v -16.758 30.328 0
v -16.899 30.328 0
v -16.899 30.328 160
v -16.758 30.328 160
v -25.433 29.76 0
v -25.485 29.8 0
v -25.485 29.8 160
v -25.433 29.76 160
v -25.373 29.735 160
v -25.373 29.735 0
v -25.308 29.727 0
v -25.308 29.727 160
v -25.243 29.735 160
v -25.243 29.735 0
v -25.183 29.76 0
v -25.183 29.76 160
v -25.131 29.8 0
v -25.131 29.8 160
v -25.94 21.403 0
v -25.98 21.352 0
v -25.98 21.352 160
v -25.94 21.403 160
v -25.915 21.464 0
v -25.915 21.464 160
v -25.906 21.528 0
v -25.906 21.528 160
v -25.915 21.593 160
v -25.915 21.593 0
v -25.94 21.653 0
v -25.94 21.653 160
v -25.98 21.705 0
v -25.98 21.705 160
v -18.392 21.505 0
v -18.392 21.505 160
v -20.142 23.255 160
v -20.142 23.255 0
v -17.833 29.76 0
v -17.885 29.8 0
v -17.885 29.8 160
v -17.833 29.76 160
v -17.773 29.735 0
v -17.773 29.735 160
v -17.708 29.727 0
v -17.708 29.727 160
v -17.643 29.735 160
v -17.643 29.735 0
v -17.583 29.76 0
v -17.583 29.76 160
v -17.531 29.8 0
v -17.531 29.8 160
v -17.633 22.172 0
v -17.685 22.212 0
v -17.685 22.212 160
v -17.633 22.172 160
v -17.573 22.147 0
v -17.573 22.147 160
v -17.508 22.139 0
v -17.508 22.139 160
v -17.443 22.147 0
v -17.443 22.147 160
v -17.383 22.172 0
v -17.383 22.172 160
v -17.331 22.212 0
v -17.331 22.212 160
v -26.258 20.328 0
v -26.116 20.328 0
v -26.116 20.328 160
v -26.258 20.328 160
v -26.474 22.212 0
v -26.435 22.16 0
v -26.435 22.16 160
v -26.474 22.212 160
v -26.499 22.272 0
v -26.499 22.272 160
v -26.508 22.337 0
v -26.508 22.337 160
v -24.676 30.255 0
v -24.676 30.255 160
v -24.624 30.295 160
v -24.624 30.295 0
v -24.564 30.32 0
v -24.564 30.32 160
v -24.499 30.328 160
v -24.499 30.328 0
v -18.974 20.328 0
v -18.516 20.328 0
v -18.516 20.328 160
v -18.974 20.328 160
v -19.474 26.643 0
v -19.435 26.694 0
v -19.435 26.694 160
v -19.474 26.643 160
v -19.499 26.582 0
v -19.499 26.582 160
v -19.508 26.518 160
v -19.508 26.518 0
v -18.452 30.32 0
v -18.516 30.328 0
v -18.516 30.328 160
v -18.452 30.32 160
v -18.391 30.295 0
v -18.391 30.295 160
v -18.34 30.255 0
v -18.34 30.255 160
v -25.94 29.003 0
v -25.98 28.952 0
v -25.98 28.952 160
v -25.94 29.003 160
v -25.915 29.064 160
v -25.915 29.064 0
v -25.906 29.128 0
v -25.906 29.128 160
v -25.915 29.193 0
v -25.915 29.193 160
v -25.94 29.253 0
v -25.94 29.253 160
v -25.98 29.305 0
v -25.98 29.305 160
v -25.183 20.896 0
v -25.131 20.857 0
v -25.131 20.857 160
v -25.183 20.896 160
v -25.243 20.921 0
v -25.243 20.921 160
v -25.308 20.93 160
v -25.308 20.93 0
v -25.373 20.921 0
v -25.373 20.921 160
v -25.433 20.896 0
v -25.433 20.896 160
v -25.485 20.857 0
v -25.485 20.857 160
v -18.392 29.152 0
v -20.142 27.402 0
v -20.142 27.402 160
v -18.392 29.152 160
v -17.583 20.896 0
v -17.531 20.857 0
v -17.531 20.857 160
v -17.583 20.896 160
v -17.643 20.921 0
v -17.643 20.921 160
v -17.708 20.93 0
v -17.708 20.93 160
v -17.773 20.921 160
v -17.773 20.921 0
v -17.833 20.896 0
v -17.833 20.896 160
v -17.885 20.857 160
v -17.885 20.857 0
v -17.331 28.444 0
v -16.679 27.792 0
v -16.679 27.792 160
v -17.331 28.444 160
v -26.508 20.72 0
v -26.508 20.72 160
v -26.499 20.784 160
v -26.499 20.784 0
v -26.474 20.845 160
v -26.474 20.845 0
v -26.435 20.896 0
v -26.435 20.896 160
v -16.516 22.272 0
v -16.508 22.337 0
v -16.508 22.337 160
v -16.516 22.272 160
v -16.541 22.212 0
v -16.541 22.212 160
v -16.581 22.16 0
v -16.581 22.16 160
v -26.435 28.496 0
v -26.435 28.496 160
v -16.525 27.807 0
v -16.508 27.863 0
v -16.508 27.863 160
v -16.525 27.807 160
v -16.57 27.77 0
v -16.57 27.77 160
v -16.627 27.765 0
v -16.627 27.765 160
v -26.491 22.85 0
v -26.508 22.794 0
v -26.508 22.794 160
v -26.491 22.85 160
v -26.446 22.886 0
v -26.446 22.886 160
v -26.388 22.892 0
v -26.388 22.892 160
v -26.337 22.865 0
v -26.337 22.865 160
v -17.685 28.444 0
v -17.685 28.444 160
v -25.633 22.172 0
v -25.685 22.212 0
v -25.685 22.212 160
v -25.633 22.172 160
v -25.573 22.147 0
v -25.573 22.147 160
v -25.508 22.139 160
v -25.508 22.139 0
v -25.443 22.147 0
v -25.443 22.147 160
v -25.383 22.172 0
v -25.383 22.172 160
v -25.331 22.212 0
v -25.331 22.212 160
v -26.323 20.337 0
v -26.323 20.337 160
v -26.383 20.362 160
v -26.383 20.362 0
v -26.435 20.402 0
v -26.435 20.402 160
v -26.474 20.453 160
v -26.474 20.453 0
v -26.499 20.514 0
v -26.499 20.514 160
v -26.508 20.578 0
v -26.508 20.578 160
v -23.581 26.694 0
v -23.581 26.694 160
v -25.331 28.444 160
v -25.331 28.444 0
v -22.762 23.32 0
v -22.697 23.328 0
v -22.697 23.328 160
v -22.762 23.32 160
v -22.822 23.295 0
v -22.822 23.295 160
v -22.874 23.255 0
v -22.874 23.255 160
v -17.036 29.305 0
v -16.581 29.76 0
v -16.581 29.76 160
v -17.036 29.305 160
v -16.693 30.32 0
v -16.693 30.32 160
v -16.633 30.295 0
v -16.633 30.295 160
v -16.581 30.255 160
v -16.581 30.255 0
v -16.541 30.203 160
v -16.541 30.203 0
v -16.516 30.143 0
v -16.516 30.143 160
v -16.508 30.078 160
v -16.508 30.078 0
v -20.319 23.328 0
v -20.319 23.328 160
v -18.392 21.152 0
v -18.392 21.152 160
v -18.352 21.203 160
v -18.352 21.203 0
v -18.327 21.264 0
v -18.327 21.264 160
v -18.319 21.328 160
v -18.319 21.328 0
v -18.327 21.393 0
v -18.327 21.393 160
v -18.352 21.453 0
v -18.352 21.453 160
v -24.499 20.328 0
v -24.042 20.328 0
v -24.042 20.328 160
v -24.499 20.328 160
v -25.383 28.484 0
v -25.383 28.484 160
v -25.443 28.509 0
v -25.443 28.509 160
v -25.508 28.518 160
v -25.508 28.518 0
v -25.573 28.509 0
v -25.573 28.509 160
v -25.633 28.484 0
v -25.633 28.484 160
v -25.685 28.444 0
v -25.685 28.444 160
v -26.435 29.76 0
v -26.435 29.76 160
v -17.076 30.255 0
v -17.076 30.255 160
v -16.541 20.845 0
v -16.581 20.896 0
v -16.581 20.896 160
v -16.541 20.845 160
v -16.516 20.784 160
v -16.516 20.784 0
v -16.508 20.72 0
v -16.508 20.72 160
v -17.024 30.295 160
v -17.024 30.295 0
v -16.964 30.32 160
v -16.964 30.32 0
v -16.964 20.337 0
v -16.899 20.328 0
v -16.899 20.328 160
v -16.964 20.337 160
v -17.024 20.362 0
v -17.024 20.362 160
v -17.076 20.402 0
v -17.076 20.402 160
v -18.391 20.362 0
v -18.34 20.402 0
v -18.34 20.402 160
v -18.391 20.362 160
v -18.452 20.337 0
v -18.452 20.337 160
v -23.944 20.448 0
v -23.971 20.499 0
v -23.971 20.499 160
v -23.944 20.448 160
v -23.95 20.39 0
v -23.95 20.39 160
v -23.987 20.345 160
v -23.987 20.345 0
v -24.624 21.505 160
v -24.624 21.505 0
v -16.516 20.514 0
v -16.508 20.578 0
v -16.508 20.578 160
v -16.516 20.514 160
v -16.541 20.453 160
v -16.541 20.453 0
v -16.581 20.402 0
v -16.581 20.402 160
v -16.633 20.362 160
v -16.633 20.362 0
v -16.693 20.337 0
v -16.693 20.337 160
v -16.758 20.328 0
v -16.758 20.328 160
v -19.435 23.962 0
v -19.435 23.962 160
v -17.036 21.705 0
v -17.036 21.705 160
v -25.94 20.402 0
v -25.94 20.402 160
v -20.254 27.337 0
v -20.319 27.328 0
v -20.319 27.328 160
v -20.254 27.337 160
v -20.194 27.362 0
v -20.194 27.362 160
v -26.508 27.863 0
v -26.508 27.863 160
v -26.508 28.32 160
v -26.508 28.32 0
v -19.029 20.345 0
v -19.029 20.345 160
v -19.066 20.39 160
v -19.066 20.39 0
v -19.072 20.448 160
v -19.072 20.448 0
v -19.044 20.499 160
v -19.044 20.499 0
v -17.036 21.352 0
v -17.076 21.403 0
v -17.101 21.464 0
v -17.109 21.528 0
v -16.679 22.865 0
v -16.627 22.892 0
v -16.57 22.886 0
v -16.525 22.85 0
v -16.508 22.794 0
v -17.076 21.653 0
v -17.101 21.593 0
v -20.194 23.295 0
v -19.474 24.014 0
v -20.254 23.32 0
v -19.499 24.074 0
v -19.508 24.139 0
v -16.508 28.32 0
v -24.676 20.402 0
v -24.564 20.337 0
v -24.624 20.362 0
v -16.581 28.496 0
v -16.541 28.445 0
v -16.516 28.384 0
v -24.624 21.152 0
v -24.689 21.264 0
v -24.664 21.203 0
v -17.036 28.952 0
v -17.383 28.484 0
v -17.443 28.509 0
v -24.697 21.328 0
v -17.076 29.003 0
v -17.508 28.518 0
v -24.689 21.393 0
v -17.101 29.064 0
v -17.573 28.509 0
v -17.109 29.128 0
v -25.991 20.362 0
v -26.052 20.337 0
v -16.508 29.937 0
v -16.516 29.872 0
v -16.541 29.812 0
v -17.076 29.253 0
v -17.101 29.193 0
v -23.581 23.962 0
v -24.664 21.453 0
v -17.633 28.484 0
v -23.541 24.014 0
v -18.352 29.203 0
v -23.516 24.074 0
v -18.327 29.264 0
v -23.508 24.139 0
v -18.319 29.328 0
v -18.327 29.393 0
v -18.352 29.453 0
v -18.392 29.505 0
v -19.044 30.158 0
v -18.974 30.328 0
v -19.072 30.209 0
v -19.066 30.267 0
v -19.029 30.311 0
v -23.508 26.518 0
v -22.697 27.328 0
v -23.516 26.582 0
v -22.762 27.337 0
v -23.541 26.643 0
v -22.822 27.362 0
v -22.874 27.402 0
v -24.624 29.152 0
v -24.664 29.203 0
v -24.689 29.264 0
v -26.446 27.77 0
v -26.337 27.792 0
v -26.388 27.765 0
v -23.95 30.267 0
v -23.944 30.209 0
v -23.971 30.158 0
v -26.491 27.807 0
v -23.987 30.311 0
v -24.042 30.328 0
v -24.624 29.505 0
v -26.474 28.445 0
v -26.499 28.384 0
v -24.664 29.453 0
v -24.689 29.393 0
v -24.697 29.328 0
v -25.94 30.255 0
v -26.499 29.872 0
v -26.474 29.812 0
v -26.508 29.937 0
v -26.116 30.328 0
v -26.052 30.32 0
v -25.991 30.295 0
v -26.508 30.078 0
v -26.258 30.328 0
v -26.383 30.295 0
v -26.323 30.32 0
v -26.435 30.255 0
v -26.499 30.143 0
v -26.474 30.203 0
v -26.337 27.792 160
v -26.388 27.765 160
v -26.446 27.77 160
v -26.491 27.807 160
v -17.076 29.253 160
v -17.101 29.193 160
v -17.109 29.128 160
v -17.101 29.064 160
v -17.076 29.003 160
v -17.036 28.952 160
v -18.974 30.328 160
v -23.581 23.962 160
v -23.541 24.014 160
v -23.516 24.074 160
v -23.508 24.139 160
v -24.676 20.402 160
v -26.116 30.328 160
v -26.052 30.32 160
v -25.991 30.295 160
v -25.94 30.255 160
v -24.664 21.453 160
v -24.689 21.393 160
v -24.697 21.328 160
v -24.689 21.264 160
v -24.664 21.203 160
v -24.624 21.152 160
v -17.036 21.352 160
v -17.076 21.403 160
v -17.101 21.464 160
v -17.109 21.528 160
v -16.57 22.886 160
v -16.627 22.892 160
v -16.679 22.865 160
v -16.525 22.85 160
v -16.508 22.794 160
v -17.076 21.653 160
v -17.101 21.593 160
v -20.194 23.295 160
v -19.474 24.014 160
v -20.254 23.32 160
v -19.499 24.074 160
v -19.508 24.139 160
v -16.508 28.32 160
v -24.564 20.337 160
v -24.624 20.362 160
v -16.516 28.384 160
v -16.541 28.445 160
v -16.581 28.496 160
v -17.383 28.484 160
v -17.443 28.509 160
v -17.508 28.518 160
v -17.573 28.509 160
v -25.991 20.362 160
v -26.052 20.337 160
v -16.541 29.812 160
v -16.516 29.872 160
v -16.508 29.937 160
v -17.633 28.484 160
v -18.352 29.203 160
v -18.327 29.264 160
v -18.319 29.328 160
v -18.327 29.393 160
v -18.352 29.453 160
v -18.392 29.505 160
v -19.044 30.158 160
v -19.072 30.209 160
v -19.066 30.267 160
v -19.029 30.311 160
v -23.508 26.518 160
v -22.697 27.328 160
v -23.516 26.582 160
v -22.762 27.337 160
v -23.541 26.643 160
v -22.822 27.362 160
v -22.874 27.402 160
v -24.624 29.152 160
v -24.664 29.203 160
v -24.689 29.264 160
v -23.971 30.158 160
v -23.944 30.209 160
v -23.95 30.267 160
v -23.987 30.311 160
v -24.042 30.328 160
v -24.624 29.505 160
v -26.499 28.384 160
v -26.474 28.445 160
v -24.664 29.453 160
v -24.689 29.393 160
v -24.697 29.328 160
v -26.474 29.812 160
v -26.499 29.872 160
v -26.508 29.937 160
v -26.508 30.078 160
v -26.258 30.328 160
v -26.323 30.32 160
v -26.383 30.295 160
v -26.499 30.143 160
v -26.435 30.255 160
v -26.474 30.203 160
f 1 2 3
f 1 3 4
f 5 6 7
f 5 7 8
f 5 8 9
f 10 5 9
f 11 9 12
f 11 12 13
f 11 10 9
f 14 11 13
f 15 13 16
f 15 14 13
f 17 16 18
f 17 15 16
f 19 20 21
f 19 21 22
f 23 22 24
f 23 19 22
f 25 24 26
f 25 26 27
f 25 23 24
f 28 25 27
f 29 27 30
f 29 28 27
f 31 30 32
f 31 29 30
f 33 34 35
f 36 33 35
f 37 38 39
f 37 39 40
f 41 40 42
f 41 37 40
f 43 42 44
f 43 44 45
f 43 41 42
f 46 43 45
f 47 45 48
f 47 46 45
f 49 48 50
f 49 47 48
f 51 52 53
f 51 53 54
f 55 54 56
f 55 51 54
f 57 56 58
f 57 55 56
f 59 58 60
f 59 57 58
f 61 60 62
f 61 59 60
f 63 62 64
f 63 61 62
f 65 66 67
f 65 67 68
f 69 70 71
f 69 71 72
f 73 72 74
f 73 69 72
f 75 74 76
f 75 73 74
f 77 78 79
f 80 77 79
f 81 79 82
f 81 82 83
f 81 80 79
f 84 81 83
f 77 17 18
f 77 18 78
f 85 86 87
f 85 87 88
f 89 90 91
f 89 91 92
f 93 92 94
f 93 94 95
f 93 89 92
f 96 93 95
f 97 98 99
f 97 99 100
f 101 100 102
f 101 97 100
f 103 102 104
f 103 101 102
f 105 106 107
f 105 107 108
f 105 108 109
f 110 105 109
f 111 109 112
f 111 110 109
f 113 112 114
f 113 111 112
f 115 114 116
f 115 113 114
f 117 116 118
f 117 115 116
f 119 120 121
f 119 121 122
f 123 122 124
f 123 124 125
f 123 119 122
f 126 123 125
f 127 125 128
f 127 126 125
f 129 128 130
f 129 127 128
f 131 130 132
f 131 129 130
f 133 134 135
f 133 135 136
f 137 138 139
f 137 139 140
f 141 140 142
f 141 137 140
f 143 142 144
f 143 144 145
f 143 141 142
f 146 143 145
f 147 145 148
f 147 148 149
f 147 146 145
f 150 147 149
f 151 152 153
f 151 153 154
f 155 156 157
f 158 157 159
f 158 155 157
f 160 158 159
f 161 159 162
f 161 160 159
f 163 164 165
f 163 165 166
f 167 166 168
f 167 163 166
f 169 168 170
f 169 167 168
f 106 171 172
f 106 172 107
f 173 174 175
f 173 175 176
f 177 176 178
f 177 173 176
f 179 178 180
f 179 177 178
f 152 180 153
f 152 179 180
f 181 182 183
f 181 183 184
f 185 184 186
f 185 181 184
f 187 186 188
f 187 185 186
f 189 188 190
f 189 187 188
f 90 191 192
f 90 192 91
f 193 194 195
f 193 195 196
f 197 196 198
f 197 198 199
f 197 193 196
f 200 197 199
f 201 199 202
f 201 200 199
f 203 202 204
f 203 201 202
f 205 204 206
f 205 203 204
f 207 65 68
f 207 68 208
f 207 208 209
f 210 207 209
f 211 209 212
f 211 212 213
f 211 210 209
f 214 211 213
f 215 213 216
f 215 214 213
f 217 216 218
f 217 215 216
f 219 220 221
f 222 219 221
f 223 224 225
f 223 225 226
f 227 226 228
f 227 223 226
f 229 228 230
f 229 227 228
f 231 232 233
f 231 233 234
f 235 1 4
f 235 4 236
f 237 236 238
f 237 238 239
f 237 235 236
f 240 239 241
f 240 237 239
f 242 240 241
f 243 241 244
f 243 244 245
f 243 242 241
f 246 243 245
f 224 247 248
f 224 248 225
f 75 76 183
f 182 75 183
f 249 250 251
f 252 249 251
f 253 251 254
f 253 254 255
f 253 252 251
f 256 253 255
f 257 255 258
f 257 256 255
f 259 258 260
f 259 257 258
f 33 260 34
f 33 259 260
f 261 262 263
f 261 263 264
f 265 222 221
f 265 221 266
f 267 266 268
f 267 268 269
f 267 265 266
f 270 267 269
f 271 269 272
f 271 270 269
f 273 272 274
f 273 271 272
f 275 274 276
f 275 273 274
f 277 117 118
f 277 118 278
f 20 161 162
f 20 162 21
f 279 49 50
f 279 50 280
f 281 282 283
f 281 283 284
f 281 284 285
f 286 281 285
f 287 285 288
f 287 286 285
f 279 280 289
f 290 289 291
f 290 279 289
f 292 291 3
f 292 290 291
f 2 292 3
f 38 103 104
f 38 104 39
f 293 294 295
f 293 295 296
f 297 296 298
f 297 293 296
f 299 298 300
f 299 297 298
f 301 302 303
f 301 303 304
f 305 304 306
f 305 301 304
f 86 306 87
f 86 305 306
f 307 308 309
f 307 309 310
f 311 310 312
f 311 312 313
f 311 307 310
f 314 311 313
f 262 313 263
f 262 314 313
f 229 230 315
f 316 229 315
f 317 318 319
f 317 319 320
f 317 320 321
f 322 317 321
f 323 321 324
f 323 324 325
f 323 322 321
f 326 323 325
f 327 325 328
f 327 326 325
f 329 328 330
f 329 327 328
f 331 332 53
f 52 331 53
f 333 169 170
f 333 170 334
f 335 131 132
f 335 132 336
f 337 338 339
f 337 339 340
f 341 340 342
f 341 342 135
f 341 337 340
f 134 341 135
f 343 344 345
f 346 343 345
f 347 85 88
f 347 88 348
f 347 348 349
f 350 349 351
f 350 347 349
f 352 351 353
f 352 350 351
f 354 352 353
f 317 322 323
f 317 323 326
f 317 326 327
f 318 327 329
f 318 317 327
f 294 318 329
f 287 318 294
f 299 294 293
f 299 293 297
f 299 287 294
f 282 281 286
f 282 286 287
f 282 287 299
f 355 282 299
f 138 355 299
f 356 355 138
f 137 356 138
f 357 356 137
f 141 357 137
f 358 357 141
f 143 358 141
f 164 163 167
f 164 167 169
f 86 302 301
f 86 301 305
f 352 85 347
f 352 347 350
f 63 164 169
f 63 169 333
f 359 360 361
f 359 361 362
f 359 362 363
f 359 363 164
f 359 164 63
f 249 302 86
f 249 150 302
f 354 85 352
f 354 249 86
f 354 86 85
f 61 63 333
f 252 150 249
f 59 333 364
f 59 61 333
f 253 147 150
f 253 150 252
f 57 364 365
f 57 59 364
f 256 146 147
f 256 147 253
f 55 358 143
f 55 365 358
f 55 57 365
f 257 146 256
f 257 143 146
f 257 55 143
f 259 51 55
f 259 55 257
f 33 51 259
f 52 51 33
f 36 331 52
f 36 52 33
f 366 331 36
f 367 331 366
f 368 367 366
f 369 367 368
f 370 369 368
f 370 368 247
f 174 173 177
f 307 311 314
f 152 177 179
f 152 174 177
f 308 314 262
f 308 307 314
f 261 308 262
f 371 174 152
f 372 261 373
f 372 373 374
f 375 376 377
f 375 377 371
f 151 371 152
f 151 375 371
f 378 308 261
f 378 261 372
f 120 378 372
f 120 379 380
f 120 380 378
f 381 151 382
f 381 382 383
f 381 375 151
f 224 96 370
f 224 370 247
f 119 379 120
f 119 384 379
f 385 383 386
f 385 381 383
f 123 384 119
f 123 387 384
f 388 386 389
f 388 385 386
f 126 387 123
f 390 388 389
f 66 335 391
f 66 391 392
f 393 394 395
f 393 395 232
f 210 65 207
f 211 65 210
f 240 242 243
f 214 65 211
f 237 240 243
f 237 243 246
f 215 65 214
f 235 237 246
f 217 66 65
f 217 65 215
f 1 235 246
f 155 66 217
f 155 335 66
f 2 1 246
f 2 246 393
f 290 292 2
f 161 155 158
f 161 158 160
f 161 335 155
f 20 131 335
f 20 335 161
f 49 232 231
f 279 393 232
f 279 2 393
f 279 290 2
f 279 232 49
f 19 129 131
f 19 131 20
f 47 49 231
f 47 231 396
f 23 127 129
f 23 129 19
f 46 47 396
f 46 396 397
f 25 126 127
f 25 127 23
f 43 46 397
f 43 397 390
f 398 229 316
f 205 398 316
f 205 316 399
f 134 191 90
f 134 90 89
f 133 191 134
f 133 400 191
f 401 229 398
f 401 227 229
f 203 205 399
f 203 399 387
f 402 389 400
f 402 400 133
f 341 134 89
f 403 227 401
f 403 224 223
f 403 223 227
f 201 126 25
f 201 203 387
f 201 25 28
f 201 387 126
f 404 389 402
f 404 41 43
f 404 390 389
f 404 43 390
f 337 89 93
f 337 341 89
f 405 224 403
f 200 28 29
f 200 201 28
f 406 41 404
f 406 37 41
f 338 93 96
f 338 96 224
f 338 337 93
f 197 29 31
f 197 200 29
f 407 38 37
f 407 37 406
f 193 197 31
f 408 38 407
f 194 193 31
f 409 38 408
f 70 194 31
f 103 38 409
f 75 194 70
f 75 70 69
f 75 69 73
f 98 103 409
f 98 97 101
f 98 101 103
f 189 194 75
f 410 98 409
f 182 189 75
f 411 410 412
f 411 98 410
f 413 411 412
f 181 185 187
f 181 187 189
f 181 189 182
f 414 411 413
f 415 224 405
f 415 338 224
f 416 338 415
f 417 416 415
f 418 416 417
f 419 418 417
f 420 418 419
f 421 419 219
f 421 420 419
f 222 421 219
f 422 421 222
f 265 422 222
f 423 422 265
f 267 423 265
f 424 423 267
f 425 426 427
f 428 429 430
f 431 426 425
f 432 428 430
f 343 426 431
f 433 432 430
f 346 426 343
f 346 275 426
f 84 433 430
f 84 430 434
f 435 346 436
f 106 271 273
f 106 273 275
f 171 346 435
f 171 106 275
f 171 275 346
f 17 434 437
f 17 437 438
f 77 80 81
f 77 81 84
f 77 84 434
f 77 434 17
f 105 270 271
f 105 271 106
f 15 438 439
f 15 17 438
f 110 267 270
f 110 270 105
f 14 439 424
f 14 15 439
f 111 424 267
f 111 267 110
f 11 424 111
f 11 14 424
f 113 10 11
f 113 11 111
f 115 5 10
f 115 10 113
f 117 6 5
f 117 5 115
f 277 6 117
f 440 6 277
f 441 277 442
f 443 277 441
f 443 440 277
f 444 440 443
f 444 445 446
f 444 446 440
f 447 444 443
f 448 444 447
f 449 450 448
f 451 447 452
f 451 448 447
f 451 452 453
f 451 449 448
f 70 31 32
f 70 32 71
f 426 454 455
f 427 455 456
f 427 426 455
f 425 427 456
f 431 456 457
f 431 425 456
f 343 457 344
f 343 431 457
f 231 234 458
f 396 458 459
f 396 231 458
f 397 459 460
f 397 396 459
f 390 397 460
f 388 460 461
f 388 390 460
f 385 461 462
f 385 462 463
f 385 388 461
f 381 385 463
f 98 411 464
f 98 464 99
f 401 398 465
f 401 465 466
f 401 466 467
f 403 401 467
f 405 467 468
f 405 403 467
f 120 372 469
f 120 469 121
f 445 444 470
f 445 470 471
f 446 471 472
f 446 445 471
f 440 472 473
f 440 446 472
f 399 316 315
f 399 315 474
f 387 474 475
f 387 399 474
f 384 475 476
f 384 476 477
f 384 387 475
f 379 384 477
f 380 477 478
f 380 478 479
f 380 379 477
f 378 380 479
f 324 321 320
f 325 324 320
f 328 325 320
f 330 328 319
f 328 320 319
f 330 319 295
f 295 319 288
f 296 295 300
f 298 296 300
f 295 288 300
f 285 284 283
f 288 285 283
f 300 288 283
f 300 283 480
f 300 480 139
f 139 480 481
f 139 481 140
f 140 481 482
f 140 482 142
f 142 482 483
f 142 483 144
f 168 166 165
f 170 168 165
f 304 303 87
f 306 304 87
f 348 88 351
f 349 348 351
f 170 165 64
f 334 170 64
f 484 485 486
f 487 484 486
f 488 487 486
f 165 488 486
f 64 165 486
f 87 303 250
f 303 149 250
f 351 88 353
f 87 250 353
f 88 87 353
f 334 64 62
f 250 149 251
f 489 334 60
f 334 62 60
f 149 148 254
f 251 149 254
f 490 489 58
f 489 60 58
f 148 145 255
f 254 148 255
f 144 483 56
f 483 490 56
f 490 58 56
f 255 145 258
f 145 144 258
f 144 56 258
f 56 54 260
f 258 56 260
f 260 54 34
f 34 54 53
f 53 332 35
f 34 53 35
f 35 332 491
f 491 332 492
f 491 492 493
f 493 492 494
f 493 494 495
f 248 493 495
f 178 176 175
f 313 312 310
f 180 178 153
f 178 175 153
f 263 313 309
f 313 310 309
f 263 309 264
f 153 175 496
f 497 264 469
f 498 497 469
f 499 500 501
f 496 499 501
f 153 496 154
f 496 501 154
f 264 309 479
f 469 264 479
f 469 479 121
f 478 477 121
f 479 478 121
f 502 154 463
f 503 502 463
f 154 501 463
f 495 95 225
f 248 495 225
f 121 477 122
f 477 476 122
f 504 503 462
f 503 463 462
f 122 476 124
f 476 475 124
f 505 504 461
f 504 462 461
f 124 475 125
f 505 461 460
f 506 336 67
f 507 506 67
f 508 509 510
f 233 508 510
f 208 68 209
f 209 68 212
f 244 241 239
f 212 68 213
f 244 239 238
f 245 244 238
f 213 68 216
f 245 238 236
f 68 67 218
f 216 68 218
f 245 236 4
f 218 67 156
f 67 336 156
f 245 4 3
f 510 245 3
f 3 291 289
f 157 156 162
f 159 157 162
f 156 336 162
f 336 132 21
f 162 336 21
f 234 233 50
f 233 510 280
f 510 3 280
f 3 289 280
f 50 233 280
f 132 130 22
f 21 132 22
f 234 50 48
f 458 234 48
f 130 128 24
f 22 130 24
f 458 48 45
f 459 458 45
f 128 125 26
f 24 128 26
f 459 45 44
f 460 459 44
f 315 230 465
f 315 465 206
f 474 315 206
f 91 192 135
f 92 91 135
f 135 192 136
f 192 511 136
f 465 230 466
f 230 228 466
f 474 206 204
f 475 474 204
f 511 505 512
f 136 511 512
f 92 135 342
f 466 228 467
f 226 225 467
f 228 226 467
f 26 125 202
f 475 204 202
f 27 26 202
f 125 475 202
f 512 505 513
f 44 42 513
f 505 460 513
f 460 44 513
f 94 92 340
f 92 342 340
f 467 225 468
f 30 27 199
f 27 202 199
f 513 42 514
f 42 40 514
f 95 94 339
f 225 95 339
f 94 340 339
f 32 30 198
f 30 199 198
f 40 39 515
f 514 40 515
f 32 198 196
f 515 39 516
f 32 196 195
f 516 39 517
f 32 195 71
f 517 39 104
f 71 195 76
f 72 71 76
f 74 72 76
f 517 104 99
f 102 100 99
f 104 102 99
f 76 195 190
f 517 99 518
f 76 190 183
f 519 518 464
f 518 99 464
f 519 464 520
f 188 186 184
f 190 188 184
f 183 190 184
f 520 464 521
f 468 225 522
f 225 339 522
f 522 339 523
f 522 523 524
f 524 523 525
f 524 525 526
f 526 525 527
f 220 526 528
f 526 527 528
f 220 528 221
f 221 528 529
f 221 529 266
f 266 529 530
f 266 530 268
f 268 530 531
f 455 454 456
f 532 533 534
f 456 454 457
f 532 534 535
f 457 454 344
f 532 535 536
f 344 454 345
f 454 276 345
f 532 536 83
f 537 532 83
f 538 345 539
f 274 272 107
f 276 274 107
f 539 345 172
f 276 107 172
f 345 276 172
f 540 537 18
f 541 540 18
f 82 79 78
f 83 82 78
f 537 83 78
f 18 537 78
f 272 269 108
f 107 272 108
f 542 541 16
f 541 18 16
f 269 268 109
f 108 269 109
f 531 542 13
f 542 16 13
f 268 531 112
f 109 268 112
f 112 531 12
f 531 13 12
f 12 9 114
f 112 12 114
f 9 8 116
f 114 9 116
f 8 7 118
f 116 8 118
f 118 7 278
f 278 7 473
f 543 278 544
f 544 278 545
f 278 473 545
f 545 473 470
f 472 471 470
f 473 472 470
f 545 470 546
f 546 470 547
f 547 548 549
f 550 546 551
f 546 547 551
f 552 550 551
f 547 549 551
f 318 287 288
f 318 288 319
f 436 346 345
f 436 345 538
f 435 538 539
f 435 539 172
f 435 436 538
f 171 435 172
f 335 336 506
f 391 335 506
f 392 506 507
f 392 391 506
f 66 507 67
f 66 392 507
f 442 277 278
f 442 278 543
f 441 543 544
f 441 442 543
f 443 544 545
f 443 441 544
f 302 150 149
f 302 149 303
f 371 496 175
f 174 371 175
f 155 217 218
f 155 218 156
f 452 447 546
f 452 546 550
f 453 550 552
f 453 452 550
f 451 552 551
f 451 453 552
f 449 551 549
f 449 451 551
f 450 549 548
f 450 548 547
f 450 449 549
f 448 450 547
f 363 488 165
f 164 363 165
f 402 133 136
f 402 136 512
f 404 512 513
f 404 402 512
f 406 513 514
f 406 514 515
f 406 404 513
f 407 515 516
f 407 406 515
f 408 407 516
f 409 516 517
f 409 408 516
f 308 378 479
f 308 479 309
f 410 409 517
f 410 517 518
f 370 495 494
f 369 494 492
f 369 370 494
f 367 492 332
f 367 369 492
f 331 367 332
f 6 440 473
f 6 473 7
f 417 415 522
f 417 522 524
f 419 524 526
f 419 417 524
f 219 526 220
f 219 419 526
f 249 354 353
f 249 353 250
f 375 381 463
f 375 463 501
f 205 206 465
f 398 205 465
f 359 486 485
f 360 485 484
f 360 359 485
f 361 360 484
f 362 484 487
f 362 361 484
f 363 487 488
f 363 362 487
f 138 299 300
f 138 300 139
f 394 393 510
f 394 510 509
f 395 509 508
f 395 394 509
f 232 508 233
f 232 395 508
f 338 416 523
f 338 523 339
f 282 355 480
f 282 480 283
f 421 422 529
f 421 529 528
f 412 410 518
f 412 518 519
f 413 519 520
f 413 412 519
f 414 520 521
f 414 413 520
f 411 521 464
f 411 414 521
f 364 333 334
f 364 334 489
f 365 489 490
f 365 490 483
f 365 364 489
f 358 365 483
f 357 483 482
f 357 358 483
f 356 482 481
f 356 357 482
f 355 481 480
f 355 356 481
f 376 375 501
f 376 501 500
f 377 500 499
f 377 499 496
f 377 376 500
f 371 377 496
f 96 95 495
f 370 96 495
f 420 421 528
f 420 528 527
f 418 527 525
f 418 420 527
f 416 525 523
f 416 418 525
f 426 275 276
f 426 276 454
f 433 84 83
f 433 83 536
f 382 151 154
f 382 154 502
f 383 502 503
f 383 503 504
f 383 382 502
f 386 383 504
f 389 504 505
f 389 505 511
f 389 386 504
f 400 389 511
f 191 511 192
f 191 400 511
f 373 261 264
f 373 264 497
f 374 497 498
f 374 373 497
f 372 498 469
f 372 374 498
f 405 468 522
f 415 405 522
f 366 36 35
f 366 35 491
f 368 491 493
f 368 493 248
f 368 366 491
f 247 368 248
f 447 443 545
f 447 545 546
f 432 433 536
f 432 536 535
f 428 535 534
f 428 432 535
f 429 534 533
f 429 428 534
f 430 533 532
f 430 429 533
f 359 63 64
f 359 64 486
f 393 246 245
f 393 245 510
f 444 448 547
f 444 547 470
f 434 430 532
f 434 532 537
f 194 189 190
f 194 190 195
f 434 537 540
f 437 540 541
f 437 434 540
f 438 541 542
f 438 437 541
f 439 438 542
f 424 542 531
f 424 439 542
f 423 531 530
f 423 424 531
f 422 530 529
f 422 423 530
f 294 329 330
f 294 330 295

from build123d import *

# Parameters (mm, degrees)
BOSS_EXTRUDE1_DEPTH = 160


with BuildPart() as part:
    # Sketch1 → Boss-Extrude1 (new body)
    with BuildSketch(Plane.XY):
        with BuildLine():
            Line((-26.434620061, 28.496491655), (-25.979594809, 28.951516907))
            ThreePointArc((-25.979594809, 28.951516907), (-25.906371503, 29.128293603), (-25.979594808, 29.305070299))
            Line((-25.979594808, 29.305070299), (-26.43462006, 29.760095551))
            ThreePointArc((-26.43462006, 29.760095551), (-26.488813248, 29.841201388), (-26.507843365, 29.936872247))
            Line((-26.507843365, 29.936872247), (-26.507843365, 30.078293605))
            ThreePointArc((-26.507843365, 30.078293605), (-26.43462006, 30.255070299), (-26.257843366, 30.328293604))
            Line((-26.257843366, 30.328293604), (-26.11642201, 30.328293604))
            ThreePointArc((-26.11642201, 30.328293604), (-26.020751153, 30.309263487), (-25.939645316, 30.255070299))
            Line((-25.939645316, 30.255070299), (-25.484620061, 29.800045045))
            ThreePointArc((-25.484620061, 29.800045045), (-25.307843366, 29.72682174), (-25.131066671, 29.800045045))
            Line((-25.131066671, 29.800045045), (-24.676041418, 30.255070298))
            ThreePointArc((-24.676041418, 30.255070298), (-24.594935581, 30.309263487), (-24.499264722, 30.328293604))
            Line((-24.499264722, 30.328293604), (-24.042157942, 30.328293604))
            ThreePointArc((-24.042157942, 30.328293604), (-23.949769989, 30.266561947), (-23.971447265, 30.157582926))
            Line((-23.971447265, 30.157582926), (-24.623959891, 29.505070299))
            ThreePointArc((-24.623959891, 29.505070299), (-24.697183196, 29.328293604), (-24.623959891, 29.15151691))
            Line((-24.623959891, 29.15151691), (-22.873959891, 27.401516909))
            ThreePointArc((-22.873959891, 27.401516909), (-22.792854054, 27.347323722), (-22.697183196, 27.328293605))
            Line((-22.697183196, 27.328293605), (-20.318503539, 27.328293605))
            ThreePointArc((-20.318503539, 27.328293605), (-20.222832681, 27.347323722), (-20.141726844, 27.401516909))
            Line((-20.141726844, 27.401516909), (-18.391726844, 29.15151691))
            ThreePointArc((-18.391726844, 29.15151691), (-18.318503539, 29.328293604), (-18.391726844, 29.505070299))
            Line((-18.391726844, 29.505070299), (-19.04423947, 30.157582926))
            ThreePointArc((-19.04423947, 30.157582926), (-19.065916745, 30.266561947), (-18.973528793, 30.328293604))
            Line((-18.973528793, 30.328293604), (-18.516422013, 30.328293604))
            ThreePointArc((-18.516422013, 30.328293604), (-18.420751155, 30.309263487), (-18.339645319, 30.2550703))
            Line((-18.339645319, 30.2550703), (-17.884620064, 29.800045045))
            ThreePointArc((-17.884620064, 29.800045045), (-17.707843369, 29.72682174), (-17.531066674, 29.800045045))
            Line((-17.531066674, 29.800045045), (-17.07604142, 30.2550703))
            ThreePointArc((-17.07604142, 30.2550703), (-16.994935583, 30.309263487), (-16.899264725, 30.328293604))
            Line((-16.899264725, 30.328293604), (-16.75784337, 30.328293604))
            ThreePointArc((-16.75784337, 30.328293604), (-16.581066675, 30.255070299), (-16.507843371, 30.078293605))
            Line((-16.507843371, 30.078293605), (-16.507843371, 29.936872247))
            ThreePointArc((-16.507843371, 29.936872247), (-16.526873488, 29.841201389), (-16.581066675, 29.760095552))
            Line((-16.581066675, 29.760095552), (-17.036091927, 29.3050703))
            ThreePointArc((-17.036091927, 29.3050703), (-17.109315232, 29.128293603), (-17.036091926, 28.951516907))
            Line((-17.036091926, 28.951516907), (-16.581066674, 28.496491655))
            ThreePointArc((-16.581066674, 28.496491655), (-16.526873486, 28.415385818), (-16.507843369, 28.31971496))
            Line((-16.507843369, 28.31971496), (-16.507843369, 27.862608178))
            ThreePointArc((-16.507843369, 27.862608178), (-16.569575025, 27.770220231), (-16.678554041, 27.791897499))
            Line((-16.678554041, 27.791897499), (-17.331066668, 28.444410126))
            ThreePointArc((-17.331066668, 28.444410126), (-17.507843364, 28.517633431), (-17.68462006, 28.444410125))
            Line((-17.68462006, 28.444410125), (-19.434620061, 26.694410125))
            ThreePointArc((-19.434620061, 26.694410125), (-19.488813248, 26.613304288), (-19.507843364, 26.51763343))
            Line((-19.507843364, 26.51763343), (-19.507843364, 24.138953775))
            ThreePointArc((-19.507843364, 24.138953775), (-19.488813247, 24.043282917), (-19.434620059, 23.962177079))
            Line((-19.434620059, 23.962177079), (-17.684620059, 22.212177079))
            ThreePointArc((-17.684620059, 22.212177079), (-17.507843363, 22.138953773), (-17.331066666, 22.212177077))
            Line((-17.331066666, 22.212177077), (-16.67855404, 22.864689704))
            ThreePointArc((-16.67855404, 22.864689704), (-16.569575019, 22.886366979), (-16.507843363, 22.793979027))
            Line((-16.507843363, 22.793979027), (-16.507843363, 22.336872245))
            ThreePointArc((-16.507843363, 22.336872245), (-16.52687348, 22.241201387), (-16.581066668, 22.16009555))
            Line((-16.581066668, 22.16009555), (-17.036091921, 21.705070296))
            ThreePointArc((-17.036091921, 21.705070296), (-17.109315225, 21.528293601), (-17.036091921, 21.351516906))
            Line((-17.036091921, 21.351516906), (-16.581066669, 20.896491654))
            ThreePointArc((-16.581066669, 20.896491654), (-16.526873481, 20.815385817), (-16.507843364, 20.719714959))
            Line((-16.507843364, 20.719714959), (-16.507843364, 20.578293601))
            ThreePointArc((-16.507843364, 20.578293601), (-16.581066669, 20.401516906), (-16.757843364, 20.328293601))
            Line((-16.757843364, 20.328293601), (-16.89926472, 20.328293601))
            ThreePointArc((-16.89926472, 20.328293601), (-16.994935578, 20.347323718), (-17.076041415, 20.401516905))
            Line((-17.076041415, 20.401516905), (-17.53106667, 20.85654216))
            ThreePointArc((-17.53106667, 20.85654216), (-17.707843365, 20.929765464), (-17.88462006, 20.85654216))
            Line((-17.88462006, 20.85654216), (-18.339645314, 20.401516905))
            ThreePointArc((-18.339645314, 20.401516905), (-18.420751151, 20.347323718), (-18.516422009, 20.328293601))
            Line((-18.516422009, 20.328293601), (-18.973528789, 20.328293601))
            ThreePointArc((-18.973528789, 20.328293601), (-19.065916743, 20.390025258), (-19.044239468, 20.499004281))
            Line((-19.044239468, 20.499004281), (-18.391726841, 21.151516907))
            ThreePointArc((-18.391726841, 21.151516907), (-18.318503536, 21.328293602), (-18.391726841, 21.505070297))
            Line((-18.391726841, 21.505070297), (-20.141726841, 23.255070297))
            ThreePointArc((-20.141726841, 23.255070297), (-20.222832678, 23.309263485), (-20.318503536, 23.328293602))
            Line((-20.318503536, 23.328293602), (-22.697183193, 23.328293602))
            ThreePointArc((-22.697183193, 23.328293602), (-22.792854051, 23.309263485), (-22.873959889, 23.255070297))
            Line((-22.873959889, 23.255070297), (-24.623959889, 21.505070297))
            ThreePointArc((-24.623959889, 21.505070297), (-24.697183193, 21.328293602), (-24.623959889, 21.151516907))
            Line((-24.623959889, 21.151516907), (-23.971447262, 20.499004281))
            ThreePointArc((-23.971447262, 20.499004281), (-23.949769986, 20.390025258), (-24.042157941, 20.328293601))
            Line((-24.042157941, 20.328293601), (-24.49926472, 20.328293601))
            ThreePointArc((-24.49926472, 20.328293601), (-24.594935579, 20.347323718), (-24.676041417, 20.401516907))
            Line((-24.676041417, 20.401516907), (-25.131066671, 20.85654216))
            ThreePointArc((-25.131066671, 20.85654216), (-25.307843365, 20.929765464), (-25.48462006, 20.85654216))
            Line((-25.48462006, 20.85654216), (-25.939645315, 20.401516906))
            ThreePointArc((-25.939645315, 20.401516906), (-26.020751152, 20.347323718), (-26.11642201, 20.328293601))
            Line((-26.11642201, 20.328293601), (-26.257843366, 20.328293601))
            ThreePointArc((-26.257843366, 20.328293601), (-26.434620061, 20.401516906), (-26.507843366, 20.578293601))
            Line((-26.507843366, 20.578293601), (-26.507843366, 20.719714959))
            ThreePointArc((-26.507843366, 20.719714959), (-26.488813249, 20.815385817), (-26.434620061, 20.896491655))
            Line((-26.434620061, 20.896491655), (-25.979594809, 21.351516907))
            ThreePointArc((-25.979594809, 21.351516907), (-25.906371505, 21.528293602), (-25.979594809, 21.705070297))
            Line((-25.979594809, 21.705070297), (-26.434620063, 22.16009555))
            ThreePointArc((-26.434620063, 22.16009555), (-26.48881325, 22.241201387), (-26.507843367, 22.336872245))
            Line((-26.507843367, 22.336872245), (-26.507843367, 22.793979027))
            ThreePointArc((-26.507843367, 22.793979027), (-26.446111711, 22.88636698), (-26.337132691, 22.864689705))
            Line((-26.337132691, 22.864689705), (-25.684620064, 22.212177078))
            ThreePointArc((-25.684620064, 22.212177078), (-25.507843369, 22.138953774), (-25.331066674, 22.212177078))
            Line((-25.331066674, 22.212177078), (-23.581066674, 23.962177078))
            ThreePointArc((-23.581066674, 23.962177078), (-23.526873485, 24.043282916), (-23.507843368, 24.138953775))
            Line((-23.507843368, 24.138953775), (-23.507843368, 26.51763343))
            ThreePointArc((-23.507843368, 26.51763343), (-23.526873484, 26.613304288), (-23.581066672, 26.694410125))
            Line((-23.581066672, 26.694410125), (-25.331066672, 28.444410125))
            ThreePointArc((-25.331066672, 28.444410125), (-25.507843367, 28.51763343), (-25.684620062, 28.444410125))
            Line((-25.684620062, 28.444410125), (-26.337132689, 27.791897498))
            ThreePointArc((-26.337132689, 27.791897498), (-26.44611171, 27.770220225), (-26.507843366, 27.862608178))
            Line((-26.507843366, 27.862608178), (-26.507843366, 28.31971496))
            ThreePointArc((-26.507843366, 28.31971496), (-26.488813249, 28.415385818), (-26.434620061, 28.496491655))
        make_face()
    extrude(amount=BOSS_EXTRUDE1_DEPTH)


solid = part.part
